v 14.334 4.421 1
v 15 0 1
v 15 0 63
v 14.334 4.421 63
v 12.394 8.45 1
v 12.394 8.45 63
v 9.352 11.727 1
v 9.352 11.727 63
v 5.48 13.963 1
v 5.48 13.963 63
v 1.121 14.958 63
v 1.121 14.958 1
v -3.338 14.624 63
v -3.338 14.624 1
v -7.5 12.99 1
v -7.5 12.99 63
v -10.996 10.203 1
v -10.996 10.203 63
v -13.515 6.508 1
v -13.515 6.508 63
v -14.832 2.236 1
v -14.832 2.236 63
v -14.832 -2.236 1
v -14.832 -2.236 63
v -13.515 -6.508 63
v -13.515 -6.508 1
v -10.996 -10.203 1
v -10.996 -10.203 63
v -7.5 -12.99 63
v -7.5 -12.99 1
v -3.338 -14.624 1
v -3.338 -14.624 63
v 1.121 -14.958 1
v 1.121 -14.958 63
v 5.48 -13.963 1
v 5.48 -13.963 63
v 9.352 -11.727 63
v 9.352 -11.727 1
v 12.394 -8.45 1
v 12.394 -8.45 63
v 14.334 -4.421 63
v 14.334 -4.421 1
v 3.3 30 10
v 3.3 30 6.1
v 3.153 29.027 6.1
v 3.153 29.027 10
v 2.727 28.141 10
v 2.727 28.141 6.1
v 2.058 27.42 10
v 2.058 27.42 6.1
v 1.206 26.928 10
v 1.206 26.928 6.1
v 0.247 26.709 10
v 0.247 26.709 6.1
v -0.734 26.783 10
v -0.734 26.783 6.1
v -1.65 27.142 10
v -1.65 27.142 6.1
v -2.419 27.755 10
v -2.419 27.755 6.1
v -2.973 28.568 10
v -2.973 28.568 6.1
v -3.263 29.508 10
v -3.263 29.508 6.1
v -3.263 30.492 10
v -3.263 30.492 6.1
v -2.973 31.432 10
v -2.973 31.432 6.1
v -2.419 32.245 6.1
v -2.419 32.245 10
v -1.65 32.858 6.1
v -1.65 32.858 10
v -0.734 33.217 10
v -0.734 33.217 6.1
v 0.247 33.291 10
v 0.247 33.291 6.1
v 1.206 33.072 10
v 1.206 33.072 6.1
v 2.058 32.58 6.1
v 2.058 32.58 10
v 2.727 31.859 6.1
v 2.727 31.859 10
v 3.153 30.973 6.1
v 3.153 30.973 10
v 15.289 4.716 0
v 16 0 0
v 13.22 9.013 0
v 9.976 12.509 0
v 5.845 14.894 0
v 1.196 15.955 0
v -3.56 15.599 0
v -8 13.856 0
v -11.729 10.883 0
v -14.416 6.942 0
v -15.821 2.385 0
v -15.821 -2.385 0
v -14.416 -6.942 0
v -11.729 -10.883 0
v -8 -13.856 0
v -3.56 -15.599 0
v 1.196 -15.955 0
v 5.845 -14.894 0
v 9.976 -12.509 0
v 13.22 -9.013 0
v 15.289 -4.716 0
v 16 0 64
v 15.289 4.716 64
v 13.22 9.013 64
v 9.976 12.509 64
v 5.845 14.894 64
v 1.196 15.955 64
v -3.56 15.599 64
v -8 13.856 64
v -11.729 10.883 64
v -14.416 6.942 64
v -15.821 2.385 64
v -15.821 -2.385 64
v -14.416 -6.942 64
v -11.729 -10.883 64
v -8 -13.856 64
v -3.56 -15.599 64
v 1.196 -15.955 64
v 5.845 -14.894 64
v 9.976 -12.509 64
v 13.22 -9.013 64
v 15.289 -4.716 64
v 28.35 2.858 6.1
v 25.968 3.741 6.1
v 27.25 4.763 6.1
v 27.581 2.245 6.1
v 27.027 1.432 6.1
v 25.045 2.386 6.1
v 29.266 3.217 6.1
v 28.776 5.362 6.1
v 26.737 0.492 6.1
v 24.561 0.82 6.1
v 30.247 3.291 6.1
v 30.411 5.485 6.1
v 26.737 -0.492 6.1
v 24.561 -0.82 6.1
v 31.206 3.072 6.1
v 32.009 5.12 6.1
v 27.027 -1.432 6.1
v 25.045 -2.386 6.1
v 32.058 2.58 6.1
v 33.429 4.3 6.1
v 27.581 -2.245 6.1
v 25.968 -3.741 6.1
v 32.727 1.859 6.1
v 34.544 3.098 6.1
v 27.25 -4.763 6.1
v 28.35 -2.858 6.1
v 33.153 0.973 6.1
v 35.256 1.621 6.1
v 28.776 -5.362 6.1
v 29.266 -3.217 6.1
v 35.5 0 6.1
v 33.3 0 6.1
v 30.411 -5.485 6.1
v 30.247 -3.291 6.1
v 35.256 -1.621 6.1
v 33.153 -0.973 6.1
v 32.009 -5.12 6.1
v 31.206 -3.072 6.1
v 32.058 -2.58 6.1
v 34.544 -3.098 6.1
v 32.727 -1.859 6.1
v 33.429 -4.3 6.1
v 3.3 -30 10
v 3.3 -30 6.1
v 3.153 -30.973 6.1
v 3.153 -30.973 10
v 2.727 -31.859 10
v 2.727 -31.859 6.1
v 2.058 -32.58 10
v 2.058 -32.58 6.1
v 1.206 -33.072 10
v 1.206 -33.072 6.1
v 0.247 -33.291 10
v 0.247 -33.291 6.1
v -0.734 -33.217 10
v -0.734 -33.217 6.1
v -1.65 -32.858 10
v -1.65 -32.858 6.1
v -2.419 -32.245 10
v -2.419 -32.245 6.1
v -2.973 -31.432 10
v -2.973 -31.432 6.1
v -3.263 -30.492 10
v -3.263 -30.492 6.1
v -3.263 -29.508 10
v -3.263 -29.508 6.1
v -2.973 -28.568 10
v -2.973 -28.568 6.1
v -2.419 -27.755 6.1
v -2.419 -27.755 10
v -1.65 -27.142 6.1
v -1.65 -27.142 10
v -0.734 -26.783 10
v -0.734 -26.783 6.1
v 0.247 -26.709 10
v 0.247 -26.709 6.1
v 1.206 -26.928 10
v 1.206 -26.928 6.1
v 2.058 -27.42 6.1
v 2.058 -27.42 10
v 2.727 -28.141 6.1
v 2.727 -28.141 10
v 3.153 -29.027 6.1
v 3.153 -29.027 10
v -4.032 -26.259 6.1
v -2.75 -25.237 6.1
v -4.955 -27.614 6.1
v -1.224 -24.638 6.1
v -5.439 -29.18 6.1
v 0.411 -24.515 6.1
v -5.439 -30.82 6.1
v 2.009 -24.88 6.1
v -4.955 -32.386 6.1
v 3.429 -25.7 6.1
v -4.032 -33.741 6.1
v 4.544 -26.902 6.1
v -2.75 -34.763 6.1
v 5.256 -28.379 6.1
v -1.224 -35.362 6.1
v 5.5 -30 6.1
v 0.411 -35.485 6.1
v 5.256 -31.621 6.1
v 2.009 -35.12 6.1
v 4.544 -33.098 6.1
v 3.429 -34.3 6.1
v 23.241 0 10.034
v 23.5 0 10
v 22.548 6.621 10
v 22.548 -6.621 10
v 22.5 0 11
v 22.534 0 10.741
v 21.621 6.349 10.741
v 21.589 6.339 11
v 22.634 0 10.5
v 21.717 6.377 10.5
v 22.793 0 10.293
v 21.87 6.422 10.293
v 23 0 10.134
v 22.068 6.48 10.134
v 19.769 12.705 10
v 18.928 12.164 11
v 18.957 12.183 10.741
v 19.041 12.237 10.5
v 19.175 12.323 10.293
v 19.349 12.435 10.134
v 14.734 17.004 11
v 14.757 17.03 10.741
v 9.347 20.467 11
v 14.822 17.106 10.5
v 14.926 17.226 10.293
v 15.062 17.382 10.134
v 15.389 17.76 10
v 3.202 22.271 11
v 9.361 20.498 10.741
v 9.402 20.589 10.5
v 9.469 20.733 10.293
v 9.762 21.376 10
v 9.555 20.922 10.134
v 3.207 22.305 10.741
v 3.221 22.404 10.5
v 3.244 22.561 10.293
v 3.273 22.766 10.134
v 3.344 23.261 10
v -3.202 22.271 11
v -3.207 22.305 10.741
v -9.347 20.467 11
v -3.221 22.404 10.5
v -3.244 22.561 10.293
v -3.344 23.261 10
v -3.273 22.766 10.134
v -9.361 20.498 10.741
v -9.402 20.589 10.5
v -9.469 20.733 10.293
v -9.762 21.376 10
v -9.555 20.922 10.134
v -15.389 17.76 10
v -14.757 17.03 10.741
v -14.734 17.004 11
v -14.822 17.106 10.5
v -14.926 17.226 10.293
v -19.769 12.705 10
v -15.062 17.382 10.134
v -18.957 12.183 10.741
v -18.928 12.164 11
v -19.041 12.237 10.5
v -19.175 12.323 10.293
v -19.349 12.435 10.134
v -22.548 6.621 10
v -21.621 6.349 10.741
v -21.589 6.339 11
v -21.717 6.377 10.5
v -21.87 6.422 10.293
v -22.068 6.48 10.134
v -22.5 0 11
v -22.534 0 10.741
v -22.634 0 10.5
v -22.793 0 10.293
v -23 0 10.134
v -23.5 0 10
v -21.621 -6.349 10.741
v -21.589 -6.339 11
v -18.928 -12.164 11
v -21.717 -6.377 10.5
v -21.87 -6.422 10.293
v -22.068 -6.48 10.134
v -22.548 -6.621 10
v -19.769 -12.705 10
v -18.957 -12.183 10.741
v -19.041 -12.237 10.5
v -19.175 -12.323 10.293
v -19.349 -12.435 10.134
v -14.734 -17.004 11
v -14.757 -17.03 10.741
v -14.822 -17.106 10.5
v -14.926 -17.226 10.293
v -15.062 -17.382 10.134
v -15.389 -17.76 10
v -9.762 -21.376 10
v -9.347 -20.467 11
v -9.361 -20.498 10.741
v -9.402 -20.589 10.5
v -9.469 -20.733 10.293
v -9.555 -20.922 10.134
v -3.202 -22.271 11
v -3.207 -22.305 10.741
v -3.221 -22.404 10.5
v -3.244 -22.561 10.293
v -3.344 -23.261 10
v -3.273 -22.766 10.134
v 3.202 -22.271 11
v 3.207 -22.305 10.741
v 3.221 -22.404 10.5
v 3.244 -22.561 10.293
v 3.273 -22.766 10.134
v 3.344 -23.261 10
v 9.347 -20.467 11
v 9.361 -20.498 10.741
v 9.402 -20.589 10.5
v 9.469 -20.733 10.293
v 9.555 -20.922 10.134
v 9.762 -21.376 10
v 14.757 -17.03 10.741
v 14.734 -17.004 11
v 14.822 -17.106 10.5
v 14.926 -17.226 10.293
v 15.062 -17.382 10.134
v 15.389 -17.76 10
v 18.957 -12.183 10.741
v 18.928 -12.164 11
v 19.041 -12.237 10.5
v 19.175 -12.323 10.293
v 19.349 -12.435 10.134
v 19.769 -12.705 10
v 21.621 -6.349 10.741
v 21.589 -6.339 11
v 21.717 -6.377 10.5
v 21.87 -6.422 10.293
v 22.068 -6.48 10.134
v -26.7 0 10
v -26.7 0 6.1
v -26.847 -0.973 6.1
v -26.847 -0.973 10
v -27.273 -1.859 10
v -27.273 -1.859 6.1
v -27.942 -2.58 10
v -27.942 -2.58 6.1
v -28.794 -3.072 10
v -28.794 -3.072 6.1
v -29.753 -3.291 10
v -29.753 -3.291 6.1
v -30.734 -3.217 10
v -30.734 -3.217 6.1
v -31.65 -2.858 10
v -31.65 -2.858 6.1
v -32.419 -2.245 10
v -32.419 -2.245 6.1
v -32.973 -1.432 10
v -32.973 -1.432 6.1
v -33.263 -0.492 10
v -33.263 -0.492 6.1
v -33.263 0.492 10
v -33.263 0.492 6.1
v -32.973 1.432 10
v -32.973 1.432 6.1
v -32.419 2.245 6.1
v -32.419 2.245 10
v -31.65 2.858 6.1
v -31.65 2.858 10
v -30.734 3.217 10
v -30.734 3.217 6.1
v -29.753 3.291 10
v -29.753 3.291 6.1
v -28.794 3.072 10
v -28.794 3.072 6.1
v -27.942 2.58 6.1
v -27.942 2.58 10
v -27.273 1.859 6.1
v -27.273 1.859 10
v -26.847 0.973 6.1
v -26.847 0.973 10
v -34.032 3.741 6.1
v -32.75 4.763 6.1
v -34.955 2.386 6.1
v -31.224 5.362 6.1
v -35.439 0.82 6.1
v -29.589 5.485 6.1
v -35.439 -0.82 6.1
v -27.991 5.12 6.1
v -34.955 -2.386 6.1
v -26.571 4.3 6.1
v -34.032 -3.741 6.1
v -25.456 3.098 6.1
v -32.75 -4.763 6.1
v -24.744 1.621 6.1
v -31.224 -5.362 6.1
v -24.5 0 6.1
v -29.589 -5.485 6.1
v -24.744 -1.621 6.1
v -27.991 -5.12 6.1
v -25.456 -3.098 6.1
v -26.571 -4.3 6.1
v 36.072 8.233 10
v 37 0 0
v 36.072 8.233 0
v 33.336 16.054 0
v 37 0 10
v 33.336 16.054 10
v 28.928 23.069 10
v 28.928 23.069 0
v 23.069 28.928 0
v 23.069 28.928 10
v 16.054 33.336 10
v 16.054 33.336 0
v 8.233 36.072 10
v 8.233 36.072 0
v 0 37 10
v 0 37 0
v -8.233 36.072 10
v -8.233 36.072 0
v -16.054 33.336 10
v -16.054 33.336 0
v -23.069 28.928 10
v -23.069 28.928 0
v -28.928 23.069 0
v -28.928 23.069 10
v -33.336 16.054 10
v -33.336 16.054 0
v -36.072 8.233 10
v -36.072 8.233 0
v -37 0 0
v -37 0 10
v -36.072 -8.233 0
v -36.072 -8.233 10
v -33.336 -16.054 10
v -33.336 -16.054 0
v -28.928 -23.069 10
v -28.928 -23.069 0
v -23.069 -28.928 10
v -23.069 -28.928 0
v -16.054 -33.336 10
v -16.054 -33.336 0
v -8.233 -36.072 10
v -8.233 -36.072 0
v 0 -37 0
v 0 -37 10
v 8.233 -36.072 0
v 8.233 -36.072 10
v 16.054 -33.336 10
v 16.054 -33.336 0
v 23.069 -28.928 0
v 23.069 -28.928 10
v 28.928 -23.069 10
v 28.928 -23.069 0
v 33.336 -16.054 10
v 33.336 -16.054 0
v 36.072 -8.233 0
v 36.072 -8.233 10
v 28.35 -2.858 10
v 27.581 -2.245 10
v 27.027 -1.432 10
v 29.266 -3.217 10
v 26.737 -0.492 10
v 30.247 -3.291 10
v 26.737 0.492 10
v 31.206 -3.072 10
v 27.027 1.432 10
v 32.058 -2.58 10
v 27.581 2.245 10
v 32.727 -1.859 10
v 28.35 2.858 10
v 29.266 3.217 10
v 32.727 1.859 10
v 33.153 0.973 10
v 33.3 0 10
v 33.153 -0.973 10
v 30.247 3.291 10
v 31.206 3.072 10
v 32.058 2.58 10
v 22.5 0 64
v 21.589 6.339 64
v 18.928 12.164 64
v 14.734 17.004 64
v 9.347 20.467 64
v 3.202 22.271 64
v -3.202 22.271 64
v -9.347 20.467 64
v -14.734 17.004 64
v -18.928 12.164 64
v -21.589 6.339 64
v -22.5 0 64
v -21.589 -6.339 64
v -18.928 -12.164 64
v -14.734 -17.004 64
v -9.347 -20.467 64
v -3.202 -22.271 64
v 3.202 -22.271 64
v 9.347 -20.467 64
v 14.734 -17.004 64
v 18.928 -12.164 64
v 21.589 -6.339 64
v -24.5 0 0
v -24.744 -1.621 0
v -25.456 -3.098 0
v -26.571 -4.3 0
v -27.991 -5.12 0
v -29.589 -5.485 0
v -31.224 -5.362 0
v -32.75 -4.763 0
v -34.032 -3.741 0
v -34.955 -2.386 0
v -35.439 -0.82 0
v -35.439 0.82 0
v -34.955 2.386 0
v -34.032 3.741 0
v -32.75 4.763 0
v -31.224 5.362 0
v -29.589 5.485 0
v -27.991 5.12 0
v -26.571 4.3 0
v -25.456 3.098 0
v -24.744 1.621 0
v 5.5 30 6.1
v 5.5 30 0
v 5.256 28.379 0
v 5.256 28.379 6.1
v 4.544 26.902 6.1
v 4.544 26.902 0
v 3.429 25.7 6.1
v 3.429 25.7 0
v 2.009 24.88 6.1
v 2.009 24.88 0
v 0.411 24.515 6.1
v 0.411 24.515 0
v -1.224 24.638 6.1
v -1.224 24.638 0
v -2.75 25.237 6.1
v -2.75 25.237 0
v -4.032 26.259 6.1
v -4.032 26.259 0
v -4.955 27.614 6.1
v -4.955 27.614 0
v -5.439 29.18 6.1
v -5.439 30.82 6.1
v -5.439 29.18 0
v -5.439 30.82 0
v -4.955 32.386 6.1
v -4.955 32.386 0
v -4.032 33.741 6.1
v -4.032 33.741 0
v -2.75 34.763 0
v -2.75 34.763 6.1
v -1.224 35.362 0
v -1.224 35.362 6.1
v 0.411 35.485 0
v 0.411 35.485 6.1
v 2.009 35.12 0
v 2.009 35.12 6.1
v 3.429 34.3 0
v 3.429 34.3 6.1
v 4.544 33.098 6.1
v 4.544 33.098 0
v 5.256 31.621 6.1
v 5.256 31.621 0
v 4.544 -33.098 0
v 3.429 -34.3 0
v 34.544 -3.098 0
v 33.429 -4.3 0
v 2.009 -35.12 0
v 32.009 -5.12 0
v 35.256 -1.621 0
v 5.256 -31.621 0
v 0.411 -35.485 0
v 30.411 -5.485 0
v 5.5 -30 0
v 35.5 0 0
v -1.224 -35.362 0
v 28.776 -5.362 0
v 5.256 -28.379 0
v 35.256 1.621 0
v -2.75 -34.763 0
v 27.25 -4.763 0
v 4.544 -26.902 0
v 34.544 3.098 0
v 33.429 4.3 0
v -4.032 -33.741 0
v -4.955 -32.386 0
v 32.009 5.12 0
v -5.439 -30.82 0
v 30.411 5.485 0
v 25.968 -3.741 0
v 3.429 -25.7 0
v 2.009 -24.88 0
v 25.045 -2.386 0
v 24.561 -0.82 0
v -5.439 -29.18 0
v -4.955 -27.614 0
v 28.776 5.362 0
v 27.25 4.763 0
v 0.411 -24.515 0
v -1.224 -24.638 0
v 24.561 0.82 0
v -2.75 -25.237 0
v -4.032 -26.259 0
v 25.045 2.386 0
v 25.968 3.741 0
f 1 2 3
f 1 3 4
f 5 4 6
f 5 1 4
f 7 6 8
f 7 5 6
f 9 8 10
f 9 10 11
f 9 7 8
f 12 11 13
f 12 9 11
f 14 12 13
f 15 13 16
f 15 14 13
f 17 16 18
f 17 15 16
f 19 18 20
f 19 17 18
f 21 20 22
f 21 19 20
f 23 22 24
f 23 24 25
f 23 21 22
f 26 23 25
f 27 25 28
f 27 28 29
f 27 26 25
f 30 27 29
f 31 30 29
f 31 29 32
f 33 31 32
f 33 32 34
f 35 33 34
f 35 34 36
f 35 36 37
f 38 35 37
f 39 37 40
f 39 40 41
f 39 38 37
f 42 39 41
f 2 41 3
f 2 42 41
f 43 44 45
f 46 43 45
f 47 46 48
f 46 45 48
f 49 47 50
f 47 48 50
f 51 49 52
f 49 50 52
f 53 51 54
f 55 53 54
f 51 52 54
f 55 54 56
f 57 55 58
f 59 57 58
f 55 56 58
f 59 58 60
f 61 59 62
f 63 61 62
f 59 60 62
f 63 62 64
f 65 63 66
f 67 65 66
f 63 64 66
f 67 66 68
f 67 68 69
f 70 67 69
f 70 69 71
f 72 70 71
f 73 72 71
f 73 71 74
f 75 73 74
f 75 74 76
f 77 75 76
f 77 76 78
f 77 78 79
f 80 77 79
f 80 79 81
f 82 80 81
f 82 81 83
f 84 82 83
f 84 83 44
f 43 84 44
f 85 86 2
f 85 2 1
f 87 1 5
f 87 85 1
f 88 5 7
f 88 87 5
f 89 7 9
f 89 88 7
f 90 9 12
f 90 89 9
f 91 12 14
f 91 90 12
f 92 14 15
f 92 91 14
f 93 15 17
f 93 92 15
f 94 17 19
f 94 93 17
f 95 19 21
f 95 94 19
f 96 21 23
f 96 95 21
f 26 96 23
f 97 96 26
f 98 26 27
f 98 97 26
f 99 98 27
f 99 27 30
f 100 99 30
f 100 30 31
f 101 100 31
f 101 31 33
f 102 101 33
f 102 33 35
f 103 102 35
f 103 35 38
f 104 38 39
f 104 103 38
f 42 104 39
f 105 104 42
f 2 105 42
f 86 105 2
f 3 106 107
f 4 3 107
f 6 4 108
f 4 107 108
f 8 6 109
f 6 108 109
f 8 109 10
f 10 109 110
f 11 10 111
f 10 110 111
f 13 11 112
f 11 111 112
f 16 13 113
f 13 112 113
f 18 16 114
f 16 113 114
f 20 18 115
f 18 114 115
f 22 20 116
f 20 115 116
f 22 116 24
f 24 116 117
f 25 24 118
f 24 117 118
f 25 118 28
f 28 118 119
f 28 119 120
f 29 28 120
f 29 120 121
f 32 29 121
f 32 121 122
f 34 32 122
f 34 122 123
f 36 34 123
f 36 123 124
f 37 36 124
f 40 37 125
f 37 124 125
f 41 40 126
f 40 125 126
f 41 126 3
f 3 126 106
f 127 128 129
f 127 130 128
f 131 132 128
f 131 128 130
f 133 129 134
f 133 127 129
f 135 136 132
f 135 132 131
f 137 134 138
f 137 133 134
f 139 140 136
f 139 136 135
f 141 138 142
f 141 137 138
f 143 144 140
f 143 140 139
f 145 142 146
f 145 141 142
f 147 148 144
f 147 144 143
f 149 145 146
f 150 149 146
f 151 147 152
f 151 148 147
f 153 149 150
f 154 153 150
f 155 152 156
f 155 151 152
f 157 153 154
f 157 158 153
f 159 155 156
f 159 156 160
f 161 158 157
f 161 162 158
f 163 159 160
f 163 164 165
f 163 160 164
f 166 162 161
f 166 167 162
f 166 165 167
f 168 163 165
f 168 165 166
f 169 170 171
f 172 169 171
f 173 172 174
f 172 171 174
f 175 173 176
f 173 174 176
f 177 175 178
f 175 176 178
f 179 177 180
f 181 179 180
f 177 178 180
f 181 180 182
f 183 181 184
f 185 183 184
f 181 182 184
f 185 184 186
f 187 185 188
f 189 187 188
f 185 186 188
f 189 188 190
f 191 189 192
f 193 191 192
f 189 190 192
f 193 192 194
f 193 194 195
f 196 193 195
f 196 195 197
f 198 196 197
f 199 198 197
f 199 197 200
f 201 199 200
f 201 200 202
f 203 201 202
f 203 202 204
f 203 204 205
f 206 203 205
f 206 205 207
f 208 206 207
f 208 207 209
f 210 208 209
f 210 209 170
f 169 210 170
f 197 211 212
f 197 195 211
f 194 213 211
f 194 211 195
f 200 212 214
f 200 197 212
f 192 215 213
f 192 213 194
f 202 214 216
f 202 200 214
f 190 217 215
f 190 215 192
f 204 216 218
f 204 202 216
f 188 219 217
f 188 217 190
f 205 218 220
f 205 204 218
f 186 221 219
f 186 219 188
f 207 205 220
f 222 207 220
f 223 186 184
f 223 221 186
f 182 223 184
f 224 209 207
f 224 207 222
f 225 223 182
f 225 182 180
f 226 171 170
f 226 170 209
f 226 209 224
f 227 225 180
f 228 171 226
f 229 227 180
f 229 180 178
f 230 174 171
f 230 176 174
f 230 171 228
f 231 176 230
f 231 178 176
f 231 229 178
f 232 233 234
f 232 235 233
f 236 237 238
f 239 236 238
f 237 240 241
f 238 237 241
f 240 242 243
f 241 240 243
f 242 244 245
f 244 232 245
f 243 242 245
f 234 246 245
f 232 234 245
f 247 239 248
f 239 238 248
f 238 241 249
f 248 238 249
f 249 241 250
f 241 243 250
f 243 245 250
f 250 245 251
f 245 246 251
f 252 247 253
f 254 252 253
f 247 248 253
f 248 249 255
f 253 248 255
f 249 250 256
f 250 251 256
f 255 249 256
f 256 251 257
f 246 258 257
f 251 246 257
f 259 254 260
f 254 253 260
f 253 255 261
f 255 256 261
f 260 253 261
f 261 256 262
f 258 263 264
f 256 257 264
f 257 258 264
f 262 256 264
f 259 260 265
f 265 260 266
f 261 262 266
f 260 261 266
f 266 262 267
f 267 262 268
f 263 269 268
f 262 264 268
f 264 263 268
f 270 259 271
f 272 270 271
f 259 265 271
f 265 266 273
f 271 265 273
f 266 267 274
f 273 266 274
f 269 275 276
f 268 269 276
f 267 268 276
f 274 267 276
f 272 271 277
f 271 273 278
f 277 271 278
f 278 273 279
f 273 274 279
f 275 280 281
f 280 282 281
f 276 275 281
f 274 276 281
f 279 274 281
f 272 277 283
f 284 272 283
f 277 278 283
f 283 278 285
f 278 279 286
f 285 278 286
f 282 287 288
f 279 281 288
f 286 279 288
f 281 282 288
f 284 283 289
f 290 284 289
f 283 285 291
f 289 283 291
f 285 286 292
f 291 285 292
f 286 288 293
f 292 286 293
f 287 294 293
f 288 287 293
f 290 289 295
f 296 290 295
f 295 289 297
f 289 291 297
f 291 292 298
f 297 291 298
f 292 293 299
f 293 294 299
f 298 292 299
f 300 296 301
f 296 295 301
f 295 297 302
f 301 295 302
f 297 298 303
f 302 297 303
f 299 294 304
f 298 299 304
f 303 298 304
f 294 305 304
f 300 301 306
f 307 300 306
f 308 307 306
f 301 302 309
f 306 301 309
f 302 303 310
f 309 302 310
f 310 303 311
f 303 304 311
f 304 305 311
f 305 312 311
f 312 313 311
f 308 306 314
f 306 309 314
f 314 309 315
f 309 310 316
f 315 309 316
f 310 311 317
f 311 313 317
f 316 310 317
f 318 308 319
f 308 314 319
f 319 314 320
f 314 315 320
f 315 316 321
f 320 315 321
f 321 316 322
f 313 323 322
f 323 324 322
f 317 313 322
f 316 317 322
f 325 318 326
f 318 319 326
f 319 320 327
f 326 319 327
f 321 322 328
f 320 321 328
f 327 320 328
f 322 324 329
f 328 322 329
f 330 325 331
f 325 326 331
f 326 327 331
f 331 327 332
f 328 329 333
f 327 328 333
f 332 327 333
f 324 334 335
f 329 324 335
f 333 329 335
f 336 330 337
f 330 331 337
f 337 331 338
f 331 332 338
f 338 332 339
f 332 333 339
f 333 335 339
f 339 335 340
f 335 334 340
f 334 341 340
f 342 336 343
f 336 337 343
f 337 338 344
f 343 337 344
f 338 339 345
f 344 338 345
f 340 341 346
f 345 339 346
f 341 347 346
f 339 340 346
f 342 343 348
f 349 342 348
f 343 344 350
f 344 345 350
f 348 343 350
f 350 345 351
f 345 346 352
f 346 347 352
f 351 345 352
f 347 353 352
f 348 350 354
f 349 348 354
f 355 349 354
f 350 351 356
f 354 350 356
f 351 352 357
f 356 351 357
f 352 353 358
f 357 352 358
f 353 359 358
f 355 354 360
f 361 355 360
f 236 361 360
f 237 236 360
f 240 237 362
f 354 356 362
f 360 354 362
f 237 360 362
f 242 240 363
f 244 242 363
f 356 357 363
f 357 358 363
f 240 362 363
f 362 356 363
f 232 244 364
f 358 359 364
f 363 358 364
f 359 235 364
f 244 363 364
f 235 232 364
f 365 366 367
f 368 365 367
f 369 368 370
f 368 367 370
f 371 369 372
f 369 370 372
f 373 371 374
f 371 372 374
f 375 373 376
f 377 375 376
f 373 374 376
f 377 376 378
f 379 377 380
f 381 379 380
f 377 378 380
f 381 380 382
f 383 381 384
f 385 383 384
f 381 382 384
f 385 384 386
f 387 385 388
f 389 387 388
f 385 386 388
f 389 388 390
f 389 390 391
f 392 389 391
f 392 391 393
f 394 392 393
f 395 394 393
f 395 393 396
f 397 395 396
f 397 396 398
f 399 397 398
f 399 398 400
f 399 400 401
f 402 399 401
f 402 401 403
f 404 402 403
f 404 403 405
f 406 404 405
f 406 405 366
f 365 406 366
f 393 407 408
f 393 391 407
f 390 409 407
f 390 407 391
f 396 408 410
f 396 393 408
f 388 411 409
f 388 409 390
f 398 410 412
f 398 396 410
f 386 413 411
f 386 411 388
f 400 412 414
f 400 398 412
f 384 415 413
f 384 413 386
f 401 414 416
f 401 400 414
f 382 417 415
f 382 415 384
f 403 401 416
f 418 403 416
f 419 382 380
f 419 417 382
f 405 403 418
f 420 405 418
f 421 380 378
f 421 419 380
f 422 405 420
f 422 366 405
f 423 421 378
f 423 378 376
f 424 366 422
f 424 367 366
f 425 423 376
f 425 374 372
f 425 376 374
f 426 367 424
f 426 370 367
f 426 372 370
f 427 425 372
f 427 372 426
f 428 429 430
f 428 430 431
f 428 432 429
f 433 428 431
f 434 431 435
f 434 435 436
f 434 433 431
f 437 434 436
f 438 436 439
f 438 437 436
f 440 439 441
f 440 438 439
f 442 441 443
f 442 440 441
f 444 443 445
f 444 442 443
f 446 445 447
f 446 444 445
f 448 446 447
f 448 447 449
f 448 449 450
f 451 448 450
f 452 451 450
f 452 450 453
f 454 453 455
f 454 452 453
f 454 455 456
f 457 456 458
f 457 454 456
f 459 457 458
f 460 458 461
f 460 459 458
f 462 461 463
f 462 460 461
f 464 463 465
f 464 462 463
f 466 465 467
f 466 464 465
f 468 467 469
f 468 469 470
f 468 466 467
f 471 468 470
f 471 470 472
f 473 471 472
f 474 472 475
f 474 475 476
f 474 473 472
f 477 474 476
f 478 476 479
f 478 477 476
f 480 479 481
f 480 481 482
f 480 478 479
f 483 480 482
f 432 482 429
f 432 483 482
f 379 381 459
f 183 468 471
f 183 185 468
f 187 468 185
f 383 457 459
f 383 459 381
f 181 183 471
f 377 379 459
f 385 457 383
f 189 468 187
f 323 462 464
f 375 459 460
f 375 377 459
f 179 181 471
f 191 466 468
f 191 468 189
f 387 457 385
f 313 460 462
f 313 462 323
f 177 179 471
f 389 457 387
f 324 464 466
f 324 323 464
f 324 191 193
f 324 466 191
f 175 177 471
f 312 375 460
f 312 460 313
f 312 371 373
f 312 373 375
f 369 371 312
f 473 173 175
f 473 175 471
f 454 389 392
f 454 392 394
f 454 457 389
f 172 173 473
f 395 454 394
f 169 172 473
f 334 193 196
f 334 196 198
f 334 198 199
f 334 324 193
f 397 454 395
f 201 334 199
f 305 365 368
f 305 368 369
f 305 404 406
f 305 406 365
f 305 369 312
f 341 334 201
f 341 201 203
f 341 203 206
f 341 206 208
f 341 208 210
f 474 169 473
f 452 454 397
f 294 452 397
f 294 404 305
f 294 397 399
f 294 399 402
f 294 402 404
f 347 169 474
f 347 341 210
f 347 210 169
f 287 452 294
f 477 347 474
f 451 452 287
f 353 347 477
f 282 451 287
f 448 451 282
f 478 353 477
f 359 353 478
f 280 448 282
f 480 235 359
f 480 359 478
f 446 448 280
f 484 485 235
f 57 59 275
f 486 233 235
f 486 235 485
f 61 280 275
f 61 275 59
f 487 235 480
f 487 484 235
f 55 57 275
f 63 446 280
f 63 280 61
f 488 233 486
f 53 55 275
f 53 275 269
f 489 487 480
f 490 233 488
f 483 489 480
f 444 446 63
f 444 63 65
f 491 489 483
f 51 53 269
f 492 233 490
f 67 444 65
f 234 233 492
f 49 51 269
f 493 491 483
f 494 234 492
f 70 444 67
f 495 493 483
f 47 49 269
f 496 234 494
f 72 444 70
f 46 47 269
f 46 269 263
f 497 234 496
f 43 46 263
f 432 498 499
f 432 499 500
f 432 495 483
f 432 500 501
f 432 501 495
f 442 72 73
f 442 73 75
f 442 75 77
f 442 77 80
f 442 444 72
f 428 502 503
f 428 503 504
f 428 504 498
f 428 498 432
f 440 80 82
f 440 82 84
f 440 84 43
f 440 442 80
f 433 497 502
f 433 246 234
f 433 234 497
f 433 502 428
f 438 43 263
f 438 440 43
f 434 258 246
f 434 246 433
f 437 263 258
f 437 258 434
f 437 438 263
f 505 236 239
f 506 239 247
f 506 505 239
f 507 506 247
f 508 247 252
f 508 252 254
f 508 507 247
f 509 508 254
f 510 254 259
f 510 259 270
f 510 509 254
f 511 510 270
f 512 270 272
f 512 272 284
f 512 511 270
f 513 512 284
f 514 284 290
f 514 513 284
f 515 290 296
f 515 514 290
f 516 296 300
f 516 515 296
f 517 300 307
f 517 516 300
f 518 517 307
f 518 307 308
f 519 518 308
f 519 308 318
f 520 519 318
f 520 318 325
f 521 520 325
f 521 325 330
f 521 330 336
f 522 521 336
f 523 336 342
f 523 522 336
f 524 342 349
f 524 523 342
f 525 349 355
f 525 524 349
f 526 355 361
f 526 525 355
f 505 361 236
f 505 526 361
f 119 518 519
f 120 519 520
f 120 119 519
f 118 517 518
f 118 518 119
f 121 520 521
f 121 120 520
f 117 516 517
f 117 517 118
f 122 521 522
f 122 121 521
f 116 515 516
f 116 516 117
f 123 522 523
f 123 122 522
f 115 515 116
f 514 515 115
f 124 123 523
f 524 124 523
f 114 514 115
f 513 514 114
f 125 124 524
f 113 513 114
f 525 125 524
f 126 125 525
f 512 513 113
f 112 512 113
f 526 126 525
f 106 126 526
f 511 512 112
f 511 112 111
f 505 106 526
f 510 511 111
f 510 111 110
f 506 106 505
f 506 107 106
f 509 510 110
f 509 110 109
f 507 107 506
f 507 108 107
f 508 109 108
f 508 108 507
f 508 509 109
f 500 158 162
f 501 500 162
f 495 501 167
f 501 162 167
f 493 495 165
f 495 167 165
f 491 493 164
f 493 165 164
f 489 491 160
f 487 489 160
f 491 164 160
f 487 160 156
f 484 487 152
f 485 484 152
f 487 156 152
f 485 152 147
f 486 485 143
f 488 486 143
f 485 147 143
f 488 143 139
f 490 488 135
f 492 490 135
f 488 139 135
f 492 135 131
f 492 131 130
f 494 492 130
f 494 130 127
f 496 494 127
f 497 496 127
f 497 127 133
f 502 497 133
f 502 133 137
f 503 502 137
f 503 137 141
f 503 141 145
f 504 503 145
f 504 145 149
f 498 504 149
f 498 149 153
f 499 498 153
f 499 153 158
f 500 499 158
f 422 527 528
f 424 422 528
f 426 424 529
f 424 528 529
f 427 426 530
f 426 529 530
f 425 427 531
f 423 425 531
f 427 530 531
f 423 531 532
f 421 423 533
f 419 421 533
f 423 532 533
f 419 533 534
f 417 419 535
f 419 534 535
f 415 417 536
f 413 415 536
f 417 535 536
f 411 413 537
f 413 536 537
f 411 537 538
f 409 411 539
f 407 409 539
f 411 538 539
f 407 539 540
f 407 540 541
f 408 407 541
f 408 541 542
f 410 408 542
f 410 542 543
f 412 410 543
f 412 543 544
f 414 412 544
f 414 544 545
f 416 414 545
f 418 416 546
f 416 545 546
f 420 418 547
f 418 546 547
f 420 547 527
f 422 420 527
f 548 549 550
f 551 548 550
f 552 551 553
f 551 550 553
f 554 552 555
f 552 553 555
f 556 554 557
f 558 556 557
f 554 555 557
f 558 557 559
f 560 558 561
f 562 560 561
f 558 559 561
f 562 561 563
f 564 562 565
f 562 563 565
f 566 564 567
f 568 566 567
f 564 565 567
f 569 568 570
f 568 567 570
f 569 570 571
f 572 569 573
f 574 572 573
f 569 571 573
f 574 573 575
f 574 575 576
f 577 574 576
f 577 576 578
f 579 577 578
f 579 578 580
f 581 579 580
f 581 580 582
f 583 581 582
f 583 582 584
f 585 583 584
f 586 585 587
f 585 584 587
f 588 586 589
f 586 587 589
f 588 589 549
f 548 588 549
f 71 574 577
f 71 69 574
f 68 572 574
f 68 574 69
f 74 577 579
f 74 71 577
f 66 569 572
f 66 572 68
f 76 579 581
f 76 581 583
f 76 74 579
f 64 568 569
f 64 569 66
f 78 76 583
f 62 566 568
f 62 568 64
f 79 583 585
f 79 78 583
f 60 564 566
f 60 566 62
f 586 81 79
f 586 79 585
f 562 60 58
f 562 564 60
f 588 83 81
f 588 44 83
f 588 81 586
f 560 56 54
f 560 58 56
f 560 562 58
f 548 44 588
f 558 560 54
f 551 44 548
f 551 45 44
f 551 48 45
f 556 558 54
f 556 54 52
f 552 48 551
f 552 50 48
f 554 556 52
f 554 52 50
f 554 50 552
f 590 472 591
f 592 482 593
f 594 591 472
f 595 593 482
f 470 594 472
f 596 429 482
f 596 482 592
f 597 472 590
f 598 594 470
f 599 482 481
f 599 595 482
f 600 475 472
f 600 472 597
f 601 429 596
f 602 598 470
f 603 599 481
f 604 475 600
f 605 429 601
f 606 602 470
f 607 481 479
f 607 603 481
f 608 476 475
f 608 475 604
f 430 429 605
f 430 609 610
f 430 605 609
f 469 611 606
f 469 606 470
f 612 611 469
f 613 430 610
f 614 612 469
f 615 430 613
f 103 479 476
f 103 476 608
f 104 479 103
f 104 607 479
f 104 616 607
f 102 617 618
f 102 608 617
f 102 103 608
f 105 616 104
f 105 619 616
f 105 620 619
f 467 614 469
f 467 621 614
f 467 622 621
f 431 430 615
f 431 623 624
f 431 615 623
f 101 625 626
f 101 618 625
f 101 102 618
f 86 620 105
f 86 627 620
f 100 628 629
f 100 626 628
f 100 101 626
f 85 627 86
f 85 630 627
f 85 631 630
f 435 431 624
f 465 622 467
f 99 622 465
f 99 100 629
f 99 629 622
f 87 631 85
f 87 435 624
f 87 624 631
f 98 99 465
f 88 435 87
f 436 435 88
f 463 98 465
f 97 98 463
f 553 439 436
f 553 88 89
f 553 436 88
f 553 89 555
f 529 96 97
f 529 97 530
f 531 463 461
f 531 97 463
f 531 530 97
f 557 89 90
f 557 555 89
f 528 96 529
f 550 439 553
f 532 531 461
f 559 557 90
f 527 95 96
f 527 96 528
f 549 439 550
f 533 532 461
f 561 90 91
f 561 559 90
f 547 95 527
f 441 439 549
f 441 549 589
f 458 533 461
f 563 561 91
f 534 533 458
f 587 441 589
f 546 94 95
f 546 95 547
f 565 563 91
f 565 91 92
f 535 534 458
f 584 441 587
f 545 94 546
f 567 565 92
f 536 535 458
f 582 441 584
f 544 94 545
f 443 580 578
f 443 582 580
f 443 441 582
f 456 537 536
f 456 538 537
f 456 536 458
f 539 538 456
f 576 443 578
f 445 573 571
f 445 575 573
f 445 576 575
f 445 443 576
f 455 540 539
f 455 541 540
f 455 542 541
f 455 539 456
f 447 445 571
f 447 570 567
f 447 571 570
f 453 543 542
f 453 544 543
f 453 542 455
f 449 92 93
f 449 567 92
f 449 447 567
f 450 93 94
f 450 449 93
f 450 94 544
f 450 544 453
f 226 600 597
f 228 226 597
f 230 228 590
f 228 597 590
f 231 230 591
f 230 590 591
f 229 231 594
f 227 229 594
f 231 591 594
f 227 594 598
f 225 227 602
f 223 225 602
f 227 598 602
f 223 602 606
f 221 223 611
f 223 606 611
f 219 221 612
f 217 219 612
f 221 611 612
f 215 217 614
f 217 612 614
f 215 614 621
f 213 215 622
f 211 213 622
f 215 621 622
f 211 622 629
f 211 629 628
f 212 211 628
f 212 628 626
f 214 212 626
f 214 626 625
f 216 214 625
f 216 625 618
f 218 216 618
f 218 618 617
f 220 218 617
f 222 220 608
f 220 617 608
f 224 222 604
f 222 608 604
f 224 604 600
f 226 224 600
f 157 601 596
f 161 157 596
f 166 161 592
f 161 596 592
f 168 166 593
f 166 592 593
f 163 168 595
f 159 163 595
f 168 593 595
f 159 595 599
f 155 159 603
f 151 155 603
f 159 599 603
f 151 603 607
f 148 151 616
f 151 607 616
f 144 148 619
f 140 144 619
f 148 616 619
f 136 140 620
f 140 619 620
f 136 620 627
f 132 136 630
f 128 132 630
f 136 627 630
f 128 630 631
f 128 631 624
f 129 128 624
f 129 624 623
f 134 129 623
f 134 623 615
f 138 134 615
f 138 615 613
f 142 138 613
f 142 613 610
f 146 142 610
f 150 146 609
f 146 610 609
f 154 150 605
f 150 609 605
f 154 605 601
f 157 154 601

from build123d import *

# Parameters (mm, degrees)
F2_R     = 3.3
F3_DEPTH = 64.001
F4_R     = 5.5
F5_DEPTH = 6.1
F6_R     = 1
F7_SIZE2 = 1
F7_SIZE  = 1
F8_SIZE  = 1


with BuildPart() as f1:
    # F0 (on Front) → F1 (revolve)
    with BuildSketch(Plane.XZ):
        Polygon((15, 64), (15, 0), (37, 0), (37, 10), (22.5, 10), (22.5, 64), align=None)
    revolve(axis=Axis((0, 0, 43.789597), (0, 0, 1)))

    # F2 (on face) → F3 (cut, through all)
    with BuildSketch(Plane(origin=(0, 0, 0), x_dir=(1, 0, 0), z_dir=(0, 0, -1))):
        with Locations((0, 30)):
            Circle(F2_R)
        with Locations((-30, 0)):
            Circle(F2_R)
        with Locations((0, -30)):
            Circle(F2_R)
        with Locations((30, 0)):
            Circle(F2_R)
    extrude(amount=-F3_DEPTH, mode=Mode.SUBTRACT)

    # F4 (on face) → F5 (cut)
    with BuildSketch(Plane(origin=(0, 0, 0), x_dir=(1, 0, 0), z_dir=(0, 0, -1))):
        with Locations((0, 30)):
            Circle(F4_R)
        with Locations((30, 0)):
            Circle(F4_R)
        with Locations((-30, 0)):
            Circle(F4_R)
        with Locations((0, -30)):
            Circle(F4_R)
    extrude(amount=-F5_DEPTH, mode=Mode.SUBTRACT)

    # F6
    f6_edges = [f1.edges().sort_by_distance(p)[0] for p in [
        (-22.5, 0, 10),
    ]]
    fillet(f6_edges, radius=F6_R)

    # F7
    f7_edges = [f1.edges().sort_by_distance(p)[0] for p in [
        (-15, 0, 0),
    ]]
    chamfer(f7_edges, length=F7_SIZE, length2=F7_SIZE2)

    # F8
    f8_edges = [f1.edges().sort_by_distance(p)[0] for p in [
        (-15, 0, 64),
    ]]
    chamfer(f8_edges, length=F8_SIZE)


solid = f1.part
